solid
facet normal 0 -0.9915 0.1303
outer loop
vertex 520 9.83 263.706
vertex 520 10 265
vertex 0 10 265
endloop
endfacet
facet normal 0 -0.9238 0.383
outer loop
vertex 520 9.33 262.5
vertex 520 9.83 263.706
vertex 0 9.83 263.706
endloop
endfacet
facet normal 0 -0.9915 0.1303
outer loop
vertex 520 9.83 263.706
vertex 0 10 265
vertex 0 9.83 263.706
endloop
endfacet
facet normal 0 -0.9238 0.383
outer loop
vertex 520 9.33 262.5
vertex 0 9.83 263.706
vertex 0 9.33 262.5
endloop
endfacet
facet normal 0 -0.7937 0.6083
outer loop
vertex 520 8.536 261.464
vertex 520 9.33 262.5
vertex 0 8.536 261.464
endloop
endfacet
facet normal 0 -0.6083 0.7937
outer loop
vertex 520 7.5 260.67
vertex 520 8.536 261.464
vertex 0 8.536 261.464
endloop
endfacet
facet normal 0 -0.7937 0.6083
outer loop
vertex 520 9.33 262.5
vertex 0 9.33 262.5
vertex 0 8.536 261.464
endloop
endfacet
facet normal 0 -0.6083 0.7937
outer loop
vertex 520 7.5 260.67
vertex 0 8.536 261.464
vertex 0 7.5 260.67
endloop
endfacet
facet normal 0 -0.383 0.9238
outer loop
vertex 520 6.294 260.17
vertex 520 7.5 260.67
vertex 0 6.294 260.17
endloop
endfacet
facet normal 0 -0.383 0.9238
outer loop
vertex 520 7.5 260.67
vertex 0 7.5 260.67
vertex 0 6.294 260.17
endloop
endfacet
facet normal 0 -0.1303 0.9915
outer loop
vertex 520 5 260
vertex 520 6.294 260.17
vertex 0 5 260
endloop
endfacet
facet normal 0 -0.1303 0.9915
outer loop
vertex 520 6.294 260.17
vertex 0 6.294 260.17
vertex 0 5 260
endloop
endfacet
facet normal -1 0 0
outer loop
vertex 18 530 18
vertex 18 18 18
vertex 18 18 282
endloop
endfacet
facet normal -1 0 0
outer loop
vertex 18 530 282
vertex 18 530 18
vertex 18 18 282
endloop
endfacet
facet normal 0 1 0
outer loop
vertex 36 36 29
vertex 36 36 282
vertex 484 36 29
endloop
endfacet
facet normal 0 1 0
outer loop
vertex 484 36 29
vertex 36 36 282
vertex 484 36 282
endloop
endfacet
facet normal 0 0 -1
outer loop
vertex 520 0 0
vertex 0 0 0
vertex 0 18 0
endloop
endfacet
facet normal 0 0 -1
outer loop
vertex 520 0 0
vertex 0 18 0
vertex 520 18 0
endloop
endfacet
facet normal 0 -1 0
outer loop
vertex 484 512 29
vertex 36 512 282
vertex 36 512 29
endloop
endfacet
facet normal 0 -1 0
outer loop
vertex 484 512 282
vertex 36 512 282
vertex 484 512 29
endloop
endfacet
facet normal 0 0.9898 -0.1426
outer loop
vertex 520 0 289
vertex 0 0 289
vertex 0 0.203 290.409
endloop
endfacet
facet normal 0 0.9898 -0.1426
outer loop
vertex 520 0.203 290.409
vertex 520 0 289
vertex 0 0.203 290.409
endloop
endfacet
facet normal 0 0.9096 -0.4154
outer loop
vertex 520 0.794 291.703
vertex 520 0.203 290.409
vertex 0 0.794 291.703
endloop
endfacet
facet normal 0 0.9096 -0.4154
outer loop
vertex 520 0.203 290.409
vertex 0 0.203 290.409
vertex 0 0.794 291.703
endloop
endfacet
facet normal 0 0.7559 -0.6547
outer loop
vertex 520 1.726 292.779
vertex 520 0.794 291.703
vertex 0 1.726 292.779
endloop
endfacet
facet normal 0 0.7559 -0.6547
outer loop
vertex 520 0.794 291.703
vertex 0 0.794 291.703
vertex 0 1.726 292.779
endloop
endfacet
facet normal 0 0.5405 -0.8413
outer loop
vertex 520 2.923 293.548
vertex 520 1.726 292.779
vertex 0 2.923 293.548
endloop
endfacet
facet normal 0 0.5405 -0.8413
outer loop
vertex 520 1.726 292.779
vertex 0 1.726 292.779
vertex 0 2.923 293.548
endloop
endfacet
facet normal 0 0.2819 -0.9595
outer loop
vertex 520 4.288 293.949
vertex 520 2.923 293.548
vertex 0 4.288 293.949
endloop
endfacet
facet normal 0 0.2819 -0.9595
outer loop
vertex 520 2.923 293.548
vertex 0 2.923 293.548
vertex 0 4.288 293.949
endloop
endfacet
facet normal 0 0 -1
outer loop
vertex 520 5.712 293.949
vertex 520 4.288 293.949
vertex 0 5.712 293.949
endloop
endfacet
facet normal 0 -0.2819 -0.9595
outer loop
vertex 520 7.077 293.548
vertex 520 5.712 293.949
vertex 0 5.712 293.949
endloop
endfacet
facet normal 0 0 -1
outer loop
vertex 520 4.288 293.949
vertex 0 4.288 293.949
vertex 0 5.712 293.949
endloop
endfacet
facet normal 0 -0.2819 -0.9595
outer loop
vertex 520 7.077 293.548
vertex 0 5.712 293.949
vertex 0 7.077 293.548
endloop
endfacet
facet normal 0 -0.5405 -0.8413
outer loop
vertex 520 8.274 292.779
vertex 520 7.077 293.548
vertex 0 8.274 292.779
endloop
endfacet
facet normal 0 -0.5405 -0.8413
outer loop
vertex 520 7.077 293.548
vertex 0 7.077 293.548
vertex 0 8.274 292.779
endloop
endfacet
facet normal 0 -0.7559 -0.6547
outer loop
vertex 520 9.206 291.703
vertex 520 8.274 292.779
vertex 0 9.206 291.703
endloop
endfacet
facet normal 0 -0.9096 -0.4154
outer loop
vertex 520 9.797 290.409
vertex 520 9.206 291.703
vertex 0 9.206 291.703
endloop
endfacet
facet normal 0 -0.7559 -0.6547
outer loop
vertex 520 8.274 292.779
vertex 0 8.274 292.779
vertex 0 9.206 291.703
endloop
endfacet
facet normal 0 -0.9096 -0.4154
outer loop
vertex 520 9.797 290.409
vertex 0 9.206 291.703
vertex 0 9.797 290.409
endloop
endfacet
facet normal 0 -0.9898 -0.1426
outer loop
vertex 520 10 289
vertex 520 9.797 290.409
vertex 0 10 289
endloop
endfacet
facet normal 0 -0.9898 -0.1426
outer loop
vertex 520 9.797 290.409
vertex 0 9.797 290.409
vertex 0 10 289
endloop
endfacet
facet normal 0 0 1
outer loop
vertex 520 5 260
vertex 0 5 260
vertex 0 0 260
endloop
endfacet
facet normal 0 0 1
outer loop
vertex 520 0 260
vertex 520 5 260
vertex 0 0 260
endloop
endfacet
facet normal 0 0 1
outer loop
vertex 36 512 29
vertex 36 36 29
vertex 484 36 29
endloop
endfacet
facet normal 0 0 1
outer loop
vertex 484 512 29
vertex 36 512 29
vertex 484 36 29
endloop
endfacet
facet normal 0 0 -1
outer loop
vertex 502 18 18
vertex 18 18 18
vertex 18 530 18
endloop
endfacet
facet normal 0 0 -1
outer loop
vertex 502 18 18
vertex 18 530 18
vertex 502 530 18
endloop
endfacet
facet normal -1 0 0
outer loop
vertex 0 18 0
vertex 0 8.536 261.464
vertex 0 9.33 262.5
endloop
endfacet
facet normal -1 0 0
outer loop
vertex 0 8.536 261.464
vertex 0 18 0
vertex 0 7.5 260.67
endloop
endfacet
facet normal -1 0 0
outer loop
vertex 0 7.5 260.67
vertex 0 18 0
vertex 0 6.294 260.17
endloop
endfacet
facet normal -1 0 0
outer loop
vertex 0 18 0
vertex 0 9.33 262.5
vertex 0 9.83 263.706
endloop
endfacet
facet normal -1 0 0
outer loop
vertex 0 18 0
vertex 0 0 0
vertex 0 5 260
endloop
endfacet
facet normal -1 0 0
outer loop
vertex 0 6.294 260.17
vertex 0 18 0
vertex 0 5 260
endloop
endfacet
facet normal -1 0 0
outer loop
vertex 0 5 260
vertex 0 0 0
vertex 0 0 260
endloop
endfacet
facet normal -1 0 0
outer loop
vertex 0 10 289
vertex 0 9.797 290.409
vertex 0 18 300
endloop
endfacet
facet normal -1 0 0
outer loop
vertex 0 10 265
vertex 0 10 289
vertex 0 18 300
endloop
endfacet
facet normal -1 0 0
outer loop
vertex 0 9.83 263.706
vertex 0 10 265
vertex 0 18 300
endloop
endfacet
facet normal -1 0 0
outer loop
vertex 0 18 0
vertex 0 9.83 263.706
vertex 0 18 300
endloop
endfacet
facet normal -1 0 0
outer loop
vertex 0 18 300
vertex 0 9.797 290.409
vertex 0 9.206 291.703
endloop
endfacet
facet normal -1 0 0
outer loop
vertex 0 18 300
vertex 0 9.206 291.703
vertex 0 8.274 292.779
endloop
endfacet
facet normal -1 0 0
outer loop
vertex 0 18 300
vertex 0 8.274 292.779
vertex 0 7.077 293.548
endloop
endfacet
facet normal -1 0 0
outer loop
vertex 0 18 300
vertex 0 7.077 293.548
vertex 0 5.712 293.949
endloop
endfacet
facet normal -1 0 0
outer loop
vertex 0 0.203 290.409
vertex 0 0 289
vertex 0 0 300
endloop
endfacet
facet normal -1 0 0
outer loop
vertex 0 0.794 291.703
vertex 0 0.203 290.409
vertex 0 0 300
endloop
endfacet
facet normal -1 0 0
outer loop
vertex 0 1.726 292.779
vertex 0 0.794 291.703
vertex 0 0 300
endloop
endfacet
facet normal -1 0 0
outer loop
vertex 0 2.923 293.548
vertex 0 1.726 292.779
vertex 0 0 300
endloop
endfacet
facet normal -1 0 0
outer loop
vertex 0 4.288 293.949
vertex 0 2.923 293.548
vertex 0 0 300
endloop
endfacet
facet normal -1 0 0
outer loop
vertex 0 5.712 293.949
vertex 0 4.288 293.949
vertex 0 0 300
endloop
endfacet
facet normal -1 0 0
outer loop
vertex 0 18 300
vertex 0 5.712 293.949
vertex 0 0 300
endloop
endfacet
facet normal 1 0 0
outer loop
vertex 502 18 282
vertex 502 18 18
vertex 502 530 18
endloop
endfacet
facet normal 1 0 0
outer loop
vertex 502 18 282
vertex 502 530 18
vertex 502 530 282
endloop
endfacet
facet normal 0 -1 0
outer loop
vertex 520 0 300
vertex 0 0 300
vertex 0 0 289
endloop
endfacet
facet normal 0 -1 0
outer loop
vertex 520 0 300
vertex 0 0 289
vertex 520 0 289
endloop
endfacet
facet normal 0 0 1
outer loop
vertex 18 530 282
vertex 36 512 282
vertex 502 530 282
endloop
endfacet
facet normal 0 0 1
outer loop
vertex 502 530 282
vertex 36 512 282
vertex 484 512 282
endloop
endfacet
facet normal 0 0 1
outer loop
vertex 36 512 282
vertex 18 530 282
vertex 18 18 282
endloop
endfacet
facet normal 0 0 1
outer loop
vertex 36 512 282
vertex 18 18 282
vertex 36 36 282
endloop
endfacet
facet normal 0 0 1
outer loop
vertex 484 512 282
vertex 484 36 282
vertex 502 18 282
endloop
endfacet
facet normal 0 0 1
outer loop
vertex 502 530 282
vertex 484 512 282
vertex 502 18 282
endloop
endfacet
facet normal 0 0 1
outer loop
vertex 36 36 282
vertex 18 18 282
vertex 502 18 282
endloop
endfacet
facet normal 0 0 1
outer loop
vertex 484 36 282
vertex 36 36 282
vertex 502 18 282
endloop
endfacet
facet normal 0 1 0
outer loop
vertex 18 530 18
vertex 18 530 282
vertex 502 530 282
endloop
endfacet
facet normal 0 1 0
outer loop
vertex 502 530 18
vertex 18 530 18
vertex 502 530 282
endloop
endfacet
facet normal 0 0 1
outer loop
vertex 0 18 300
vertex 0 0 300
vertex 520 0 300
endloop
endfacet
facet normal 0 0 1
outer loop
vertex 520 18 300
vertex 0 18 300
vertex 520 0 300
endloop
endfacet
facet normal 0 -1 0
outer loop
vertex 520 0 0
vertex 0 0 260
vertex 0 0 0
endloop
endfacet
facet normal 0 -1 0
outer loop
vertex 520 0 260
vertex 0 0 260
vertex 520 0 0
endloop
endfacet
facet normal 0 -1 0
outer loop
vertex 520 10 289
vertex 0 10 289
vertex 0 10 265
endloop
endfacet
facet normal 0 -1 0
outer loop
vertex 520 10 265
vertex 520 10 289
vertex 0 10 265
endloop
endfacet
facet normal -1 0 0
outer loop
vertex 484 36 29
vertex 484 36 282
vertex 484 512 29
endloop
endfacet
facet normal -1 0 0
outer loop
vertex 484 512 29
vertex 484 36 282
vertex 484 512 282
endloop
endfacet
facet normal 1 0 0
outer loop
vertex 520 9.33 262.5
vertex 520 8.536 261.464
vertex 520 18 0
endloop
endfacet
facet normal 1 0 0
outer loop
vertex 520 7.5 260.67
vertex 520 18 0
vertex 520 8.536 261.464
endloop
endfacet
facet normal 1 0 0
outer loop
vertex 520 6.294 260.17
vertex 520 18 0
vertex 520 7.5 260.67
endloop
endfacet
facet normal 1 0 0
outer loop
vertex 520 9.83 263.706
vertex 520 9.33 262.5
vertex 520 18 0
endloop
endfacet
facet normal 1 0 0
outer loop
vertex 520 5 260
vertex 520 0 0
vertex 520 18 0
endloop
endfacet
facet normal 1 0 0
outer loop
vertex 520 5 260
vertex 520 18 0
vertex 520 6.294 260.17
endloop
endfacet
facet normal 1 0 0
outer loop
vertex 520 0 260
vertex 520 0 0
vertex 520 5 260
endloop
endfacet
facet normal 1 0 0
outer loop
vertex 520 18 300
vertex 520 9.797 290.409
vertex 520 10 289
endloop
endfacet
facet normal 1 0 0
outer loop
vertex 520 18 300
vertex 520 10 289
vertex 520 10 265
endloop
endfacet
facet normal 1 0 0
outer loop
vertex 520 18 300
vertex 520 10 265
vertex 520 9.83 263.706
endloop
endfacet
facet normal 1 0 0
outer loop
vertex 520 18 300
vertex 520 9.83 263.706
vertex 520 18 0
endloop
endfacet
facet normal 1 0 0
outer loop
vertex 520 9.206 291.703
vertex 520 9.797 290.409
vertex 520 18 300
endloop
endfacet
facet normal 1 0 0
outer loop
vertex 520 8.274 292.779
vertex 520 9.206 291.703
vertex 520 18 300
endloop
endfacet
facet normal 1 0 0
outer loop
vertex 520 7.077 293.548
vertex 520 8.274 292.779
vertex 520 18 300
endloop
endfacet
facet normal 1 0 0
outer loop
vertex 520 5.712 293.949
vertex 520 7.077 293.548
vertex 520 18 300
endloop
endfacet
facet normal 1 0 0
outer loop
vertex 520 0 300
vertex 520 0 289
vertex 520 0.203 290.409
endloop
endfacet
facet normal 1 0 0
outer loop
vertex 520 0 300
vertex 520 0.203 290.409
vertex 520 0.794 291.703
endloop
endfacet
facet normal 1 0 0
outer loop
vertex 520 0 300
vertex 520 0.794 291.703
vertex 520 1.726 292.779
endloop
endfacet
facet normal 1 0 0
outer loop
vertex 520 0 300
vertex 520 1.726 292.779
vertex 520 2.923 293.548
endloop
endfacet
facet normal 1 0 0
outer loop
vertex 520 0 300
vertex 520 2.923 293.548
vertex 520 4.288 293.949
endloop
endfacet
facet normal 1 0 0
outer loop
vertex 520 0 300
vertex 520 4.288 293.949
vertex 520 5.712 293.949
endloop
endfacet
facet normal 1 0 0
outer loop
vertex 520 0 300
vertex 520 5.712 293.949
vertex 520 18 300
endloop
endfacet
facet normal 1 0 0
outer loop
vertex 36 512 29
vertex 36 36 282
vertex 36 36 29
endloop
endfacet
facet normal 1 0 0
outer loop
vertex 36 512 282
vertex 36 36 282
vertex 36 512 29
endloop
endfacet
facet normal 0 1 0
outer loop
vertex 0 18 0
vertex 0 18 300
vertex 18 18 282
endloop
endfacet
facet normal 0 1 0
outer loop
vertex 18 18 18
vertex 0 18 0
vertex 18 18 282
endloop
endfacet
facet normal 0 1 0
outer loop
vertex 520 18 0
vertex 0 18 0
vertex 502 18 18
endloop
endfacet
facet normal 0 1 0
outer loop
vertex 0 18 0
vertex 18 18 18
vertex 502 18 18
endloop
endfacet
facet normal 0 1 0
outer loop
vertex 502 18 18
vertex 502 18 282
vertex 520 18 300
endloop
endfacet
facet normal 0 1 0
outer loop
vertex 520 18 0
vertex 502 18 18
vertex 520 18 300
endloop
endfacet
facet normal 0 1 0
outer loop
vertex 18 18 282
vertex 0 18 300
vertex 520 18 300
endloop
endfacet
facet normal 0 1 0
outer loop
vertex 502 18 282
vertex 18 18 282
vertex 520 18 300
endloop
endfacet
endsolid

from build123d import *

# Parameters (mm, degrees)
F0_W     = 520
F0_H     = 300
F0_W_2   = 484
F0_H_2   = 264
F1_DEPTH = 18
F2_DEPTH = 530
F3_W     = 448
F3_H     = 476
F4_DEPTH = 253
F6_DEPTH = 545


with BuildPart() as f1:
    # F0 (on Front) → F1 (new body)
    with BuildSketch(Plane.XZ):
        with Locations((260, 150)):
            Rectangle(F0_W, F0_H)
        with Locations((260, 150)):
            Rectangle(F0_W_2, F0_H_2, mode=Mode.SUBTRACT)
    extrude(amount=-F1_DEPTH)

    # F0 (on Front) → F2 (join)
    with BuildSketch(Plane.XZ):
        with Locations((260, 150)):
            Rectangle(F0_W_2, F0_H_2)
    extrude(amount=-F2_DEPTH)

    # F3 (on face) → F4 (cut)
    with BuildSketch(Plane.XY.offset(282)):
        with Locations((260, 274)):
            Rectangle(F3_W, F3_H)
    extrude(amount=-F4_DEPTH, mode=Mode.SUBTRACT)

    # F5 (on face) → F6 (cut)
    with BuildSketch(Plane(origin=(0, 0, 0), x_dir=(0, -1, 0), z_dir=(-1, 0, 0))):
        with BuildLine():
            Line((-5, 260), (0, 260))
            Line((0, 260), (0, 289))
            ThreePointArc((0, 289), (-5, 294), (-10, 289))
            Line((-10, 289), (-10, 265))
            ThreePointArc((-10, 265), (-8.535534, 261.464466), (-5, 260))
        make_face()
    extrude(amount=-F6_DEPTH, mode=Mode.SUBTRACT)


solid = f1.part
